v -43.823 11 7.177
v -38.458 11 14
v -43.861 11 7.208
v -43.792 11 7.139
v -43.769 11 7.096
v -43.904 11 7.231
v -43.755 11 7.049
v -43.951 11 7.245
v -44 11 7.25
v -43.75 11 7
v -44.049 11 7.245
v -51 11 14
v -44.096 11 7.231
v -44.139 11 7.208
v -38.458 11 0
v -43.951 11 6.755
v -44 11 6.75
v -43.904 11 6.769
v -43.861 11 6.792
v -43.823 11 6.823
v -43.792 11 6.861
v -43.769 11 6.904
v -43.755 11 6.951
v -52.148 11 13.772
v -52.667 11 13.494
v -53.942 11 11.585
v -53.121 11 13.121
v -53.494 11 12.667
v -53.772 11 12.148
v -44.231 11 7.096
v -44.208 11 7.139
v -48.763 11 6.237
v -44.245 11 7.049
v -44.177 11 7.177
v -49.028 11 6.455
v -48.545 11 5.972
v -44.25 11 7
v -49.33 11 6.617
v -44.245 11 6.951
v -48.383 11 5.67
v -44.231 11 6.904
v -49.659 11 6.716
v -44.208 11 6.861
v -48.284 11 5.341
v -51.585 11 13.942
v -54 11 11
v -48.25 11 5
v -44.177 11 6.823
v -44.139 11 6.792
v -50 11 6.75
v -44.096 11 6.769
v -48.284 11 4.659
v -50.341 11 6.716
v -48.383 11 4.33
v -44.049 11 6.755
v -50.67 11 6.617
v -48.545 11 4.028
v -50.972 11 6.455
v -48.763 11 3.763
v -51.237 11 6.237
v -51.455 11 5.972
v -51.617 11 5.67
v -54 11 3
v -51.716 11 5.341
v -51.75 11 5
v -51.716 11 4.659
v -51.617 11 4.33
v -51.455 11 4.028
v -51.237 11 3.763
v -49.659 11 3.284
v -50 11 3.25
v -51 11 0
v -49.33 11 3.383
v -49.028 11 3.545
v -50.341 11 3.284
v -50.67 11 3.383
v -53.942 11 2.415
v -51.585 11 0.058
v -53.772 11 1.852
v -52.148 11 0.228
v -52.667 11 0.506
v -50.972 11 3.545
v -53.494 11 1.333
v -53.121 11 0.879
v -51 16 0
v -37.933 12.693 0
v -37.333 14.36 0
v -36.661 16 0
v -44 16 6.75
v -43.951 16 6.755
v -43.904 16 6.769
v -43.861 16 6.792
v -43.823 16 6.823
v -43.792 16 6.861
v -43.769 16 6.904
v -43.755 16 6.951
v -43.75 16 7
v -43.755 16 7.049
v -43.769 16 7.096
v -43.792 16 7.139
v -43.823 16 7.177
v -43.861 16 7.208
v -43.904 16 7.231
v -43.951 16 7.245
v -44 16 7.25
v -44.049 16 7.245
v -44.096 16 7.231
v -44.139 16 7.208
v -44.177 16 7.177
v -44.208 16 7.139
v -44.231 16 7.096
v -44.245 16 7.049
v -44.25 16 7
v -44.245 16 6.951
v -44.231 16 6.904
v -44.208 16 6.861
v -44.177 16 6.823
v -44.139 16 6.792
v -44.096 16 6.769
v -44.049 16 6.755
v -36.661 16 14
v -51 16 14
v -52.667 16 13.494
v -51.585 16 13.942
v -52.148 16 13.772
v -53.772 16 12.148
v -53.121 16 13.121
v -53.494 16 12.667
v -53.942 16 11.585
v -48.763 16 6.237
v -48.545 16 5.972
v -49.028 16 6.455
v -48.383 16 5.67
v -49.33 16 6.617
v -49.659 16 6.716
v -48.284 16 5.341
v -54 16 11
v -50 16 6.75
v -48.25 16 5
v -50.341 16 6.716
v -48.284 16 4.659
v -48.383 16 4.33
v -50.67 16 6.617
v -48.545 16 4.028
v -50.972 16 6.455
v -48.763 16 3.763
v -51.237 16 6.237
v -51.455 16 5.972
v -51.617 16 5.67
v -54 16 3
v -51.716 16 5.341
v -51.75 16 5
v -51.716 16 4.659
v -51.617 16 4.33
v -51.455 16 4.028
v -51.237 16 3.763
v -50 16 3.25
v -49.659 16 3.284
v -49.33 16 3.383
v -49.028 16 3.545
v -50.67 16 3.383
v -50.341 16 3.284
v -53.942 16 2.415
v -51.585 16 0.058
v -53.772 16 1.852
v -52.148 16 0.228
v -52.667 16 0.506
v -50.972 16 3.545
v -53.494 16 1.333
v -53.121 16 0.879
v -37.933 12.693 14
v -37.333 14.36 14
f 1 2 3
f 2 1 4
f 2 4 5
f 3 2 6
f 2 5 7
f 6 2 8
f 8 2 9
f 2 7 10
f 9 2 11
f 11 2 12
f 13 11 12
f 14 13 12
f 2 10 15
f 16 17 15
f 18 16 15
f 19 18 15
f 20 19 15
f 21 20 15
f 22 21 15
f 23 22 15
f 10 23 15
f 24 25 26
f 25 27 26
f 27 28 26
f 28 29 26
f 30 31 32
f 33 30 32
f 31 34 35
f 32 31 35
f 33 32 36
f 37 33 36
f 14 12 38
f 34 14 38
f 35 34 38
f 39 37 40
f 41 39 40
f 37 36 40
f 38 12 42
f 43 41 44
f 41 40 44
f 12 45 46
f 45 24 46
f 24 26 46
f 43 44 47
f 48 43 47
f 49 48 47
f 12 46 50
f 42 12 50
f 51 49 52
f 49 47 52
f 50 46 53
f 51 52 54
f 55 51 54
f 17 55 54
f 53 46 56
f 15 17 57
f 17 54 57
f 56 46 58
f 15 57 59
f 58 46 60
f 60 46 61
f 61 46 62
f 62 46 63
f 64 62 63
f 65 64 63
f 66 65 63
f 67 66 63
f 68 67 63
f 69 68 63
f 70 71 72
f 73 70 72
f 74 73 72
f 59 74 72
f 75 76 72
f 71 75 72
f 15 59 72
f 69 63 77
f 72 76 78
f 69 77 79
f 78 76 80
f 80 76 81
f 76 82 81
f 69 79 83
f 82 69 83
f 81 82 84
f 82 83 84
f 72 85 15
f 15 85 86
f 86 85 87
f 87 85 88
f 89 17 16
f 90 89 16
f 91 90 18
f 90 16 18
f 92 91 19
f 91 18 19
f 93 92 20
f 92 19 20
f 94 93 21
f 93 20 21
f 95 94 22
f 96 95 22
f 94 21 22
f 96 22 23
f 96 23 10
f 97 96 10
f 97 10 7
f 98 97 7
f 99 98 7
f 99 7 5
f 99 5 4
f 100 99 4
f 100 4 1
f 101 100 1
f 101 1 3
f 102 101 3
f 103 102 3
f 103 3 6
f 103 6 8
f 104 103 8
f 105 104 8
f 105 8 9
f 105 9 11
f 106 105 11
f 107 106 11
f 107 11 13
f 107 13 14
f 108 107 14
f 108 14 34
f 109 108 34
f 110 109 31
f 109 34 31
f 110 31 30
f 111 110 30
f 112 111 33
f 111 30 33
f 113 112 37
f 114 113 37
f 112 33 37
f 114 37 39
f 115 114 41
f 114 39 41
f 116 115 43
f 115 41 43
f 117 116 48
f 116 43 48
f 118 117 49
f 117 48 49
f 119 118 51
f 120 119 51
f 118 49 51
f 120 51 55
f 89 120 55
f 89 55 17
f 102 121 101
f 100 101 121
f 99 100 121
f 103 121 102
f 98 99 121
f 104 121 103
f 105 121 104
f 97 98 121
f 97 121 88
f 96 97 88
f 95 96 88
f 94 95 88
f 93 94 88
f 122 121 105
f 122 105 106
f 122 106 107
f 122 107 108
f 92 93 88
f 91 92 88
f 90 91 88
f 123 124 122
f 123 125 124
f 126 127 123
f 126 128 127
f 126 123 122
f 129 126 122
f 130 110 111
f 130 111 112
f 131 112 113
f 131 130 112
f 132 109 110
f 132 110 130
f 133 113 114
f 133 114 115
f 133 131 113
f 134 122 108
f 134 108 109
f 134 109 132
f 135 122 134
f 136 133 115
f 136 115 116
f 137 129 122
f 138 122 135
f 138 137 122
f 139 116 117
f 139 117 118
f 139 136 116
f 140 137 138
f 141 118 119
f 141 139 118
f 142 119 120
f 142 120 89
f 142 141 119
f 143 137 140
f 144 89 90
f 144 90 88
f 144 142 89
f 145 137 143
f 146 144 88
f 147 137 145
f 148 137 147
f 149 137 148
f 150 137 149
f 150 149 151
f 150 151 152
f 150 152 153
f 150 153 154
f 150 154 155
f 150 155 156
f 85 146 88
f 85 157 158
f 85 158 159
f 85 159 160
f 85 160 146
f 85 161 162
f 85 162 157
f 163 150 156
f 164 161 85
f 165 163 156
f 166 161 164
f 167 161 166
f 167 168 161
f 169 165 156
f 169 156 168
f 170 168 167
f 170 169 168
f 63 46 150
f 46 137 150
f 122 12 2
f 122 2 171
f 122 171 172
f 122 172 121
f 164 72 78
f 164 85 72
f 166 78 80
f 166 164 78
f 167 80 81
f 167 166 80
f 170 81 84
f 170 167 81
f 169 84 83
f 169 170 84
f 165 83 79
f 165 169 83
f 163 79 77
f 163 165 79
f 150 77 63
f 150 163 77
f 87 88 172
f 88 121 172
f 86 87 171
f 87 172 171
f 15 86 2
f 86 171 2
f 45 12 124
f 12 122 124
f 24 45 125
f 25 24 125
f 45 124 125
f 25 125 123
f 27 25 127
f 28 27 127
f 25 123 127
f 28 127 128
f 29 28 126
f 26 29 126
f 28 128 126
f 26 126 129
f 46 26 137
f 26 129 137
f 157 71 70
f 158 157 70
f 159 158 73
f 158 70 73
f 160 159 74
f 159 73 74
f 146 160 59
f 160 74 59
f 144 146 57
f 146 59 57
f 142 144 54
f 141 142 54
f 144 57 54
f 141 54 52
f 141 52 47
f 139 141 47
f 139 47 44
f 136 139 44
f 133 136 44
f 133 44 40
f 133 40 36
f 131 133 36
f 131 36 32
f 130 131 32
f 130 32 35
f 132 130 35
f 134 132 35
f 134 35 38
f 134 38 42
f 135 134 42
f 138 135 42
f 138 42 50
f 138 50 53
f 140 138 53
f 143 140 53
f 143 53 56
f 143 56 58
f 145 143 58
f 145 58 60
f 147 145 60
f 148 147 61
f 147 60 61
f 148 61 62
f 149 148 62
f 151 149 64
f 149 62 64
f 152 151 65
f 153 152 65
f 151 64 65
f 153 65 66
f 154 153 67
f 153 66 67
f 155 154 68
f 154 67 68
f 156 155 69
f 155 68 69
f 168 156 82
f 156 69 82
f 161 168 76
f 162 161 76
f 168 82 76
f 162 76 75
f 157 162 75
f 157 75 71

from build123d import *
from build123d.topology import SkipClean

# Parameters (mm, degrees)
SKETCH1_R                      = 40
SKETCH1_R_2                    = 38
BOSS_EXTRUDE1_DEPTH            = 200
SKETCH2_R                      = 40
BOSS_EXTRUDE2_DEPTH            = 2
BOSS_EXTRUDE3_DEPTH            = 107
BOSS_EXTRUDE4_DEPTH            = 2
SKETCH5_R                      = 1.75
CUT_EXTRUDE1_DEPTH             = 225.428162226
CUT_EXTRUDE2_REACH             = 218.296
SKETCH6_R                      = 4
CUT_EXTRUDE2_DIRECTION_2_REACH = 218.296
CIRPATTERN1_COUNT              = 2
CIRPATTERN1_ANGLE              = 90
BOSS_EXTRUDE5_REACH            = 241.742
BOSS_EXTRUDE5_END_RADIUS       = 40
SKETCH7_W                      = 14
SKETCH7_H                      = 5
CUT_EXTRUDE3_REACH             = 221.818
SKETCH8_R                      = 1.75
FILLET1_R                      = 3
CUT_EXTRUDE4_REACH             = 220.598
SKETCH9_R                      = 0.25
BOSS_EXTRUDE6_START            = 2
BOSS_EXTRUDE6_DEPTH            = 2
CUT_EXTRUDE5_REACH             = 220.147


with BuildPart() as part:
    # Sketch1 → Boss-Extrude1 (new body)
    with BuildSketch(Plane.XY):
        Circle(SKETCH1_R)
        Circle(SKETCH1_R_2, mode=Mode.SUBTRACT)
    extrude(amount=BOSS_EXTRUDE1_DEPTH)

    # Sketch2 → Boss-Extrude2 (add)
    with BuildSketch(Plane.XY.offset(180)):
        Circle(SKETCH2_R)
    extrude(amount=BOSS_EXTRUDE2_DEPTH)

    # Sketch3 → Boss-Extrude3 (add)
    with BuildSketch(Plane(origin=(0, 0, 0), x_dir=(-1, 0, 0), z_dir=(0, 0, -1))):
        with BuildLine():
            Line((-24, -32), (-72, -32))
            Line((-72, -32), (-72, -30))
            Line((-72, -30), (-26.457513111, -30))
            ThreePointArc((-26.457513111, -30), (-25.248567431, -31.024342744), (-24, -32))
        make_face()
        with BuildLine():
            Line((-24, 32), (-72, 32))
            Line((-72, 32), (-72, 30))
            Line((-72, 30), (-26.457513111, 30))
            ThreePointArc((-26.457513111, 30), (-25.248567431, 31.024342744), (-24, 32))
        make_face()
    extrude(amount=-BOSS_EXTRUDE3_DEPTH)

    # Sketch4 → Boss-Extrude4 (add)
    with BuildSketch(Plane.XY.offset(107)):
        with BuildLine():
            Line((72, -32), (24, -32))
            ThreePointArc((24, -32), (40, 0), (24, 32))
            Line((24, 32), (72, 32))
            Line((72, 32), (72, -32))
        make_face()
    extrude(amount=BOSS_EXTRUDE4_DEPTH)

    # Sketch5 → Cut-Extrude1 (cut, through all)
    with BuildSketch(Plane(origin=(0, 32, 0), x_dir=(1, 0, 0), z_dir=(0, 1, 0))):
        with Locations(Location((43.5, -102.5, 0), (0, 0, 270))):
            Circle(SKETCH5_R)
        with Locations(Location((43.5, -3.5, 0), (0, 0, 270))):
            Circle(SKETCH5_R)
        with Locations(Location((68.5, -78, 0), (0, 0, 270))):
            Circle(SKETCH5_R)
    extrude(amount=-CUT_EXTRUDE1_DEPTH, mode=Mode.SUBTRACT)

    # Sketch6 → Cut-Extrude2 (cut, up to next)
    with BuildSketch(Plane(origin=(0, 0, 0), x_dir=(0, 0, 1), z_dir=(-0.7071067811865488, 0.7071067811865464, 0)), mode=Mode.PRIVATE) as cut_extrude2_sk1:
        with Locations(Location((187, 0, 0), (0, 0, 90))):
            Circle(SKETCH6_R)
    cut_extrude2_tool1 = extrude(cut_extrude2_sk1.sketch, amount=-CUT_EXTRUDE2_REACH, mode=Mode.PRIVATE) & part.part
    cut_extrude2 = cut_extrude2_tool1.solids().sort_by_distance((0, 0, 187))[0]
    add(cut_extrude2, mode=Mode.SUBTRACT)

    # Sketch6 → Cut-Extrude2 direction 2 (cut, up to next)
    with BuildSketch(Plane(origin=(0, 0, 0), x_dir=(0, 0, 1), z_dir=(-0.7071067811865488, 0.7071067811865464, 0)), mode=Mode.PRIVATE) as cut_extrude2_direction_2_sk1:
        with Locations(Location((187, 0, 0), (0, 0, 90))):
            Circle(SKETCH6_R)
    cut_extrude2_direction_2_tool1 = extrude(cut_extrude2_direction_2_sk1.sketch, amount=CUT_EXTRUDE2_DIRECTION_2_REACH, mode=Mode.PRIVATE) & part.part
    cut_extrude2_direction_2 = cut_extrude2_direction_2_tool1.solids().sort_by_distance((0, 0, 187))[0]
    add(cut_extrude2_direction_2, mode=Mode.SUBTRACT)

    # CirPattern1: Cut-Extrude2, Cut-Extrude2 direction 2 ×2 about axis
    cirpattern1_axis = Axis((0, 0, -12.1), (0, 0, 1))
    add([cut_extrude2.rotate(cirpattern1_axis, i * CIRPATTERN1_ANGLE / (CIRPATTERN1_COUNT - 1)) for i in range(1, CIRPATTERN1_COUNT)], mode=Mode.SUBTRACT)
    add([cut_extrude2_direction_2.rotate(cirpattern1_axis, i * CIRPATTERN1_ANGLE / (CIRPATTERN1_COUNT - 1)) for i in range(1, CIRPATTERN1_COUNT)], mode=Mode.SUBTRACT)

    # Boss-Extrude5: up to this cylinder (the profile starts outside it)
    boss_extrude5_end = Plane(origin=(0, 0, 7), z_dir=(0, 0, -1)) * Cylinder(BOSS_EXTRUDE5_END_RADIUS, 564.484, mode=Mode.PRIVATE)
    # Sketch7 → Boss-Extrude5 (add, up to the surface)
    with BuildSketch(Plane(origin=(-54, 0, 0), x_dir=(0, 0, -1), z_dir=(1, 0, 0)), mode=Mode.PRIVATE) as boss_extrude5_sk1:
        with Locations((-7, -13.5)):
            Rectangle(SKETCH7_W, SKETCH7_H)
    boss_extrude5_tool1 = extrude(boss_extrude5_sk1.sketch, amount=BOSS_EXTRUDE5_REACH, mode=Mode.PRIVATE) - boss_extrude5_end
    add(boss_extrude5_tool1.solids().sort_by_distance((-54, -13.5, 7))[0])
    # Sketch7 → Boss-Extrude5 (add, up to the surface)
    with BuildSketch(Plane(origin=(-54, 0, 0), x_dir=(0, 0, -1), z_dir=(1, 0, 0)), mode=Mode.PRIVATE) as boss_extrude5_sk2:
        with Locations((-7, 13.5)):
            Rectangle(SKETCH7_W, SKETCH7_H)
    boss_extrude5_tool2 = extrude(boss_extrude5_sk2.sketch, amount=BOSS_EXTRUDE5_REACH, mode=Mode.PRIVATE) - boss_extrude5_end
    add(boss_extrude5_tool2.solids().sort_by_distance((-54, 13.5, 7))[0])

    # Cut-Extrude3: up to this face of the body (flat: up to its plane)
    cut_extrude3_end = Plane(part.part.faces().sort_by_distance((-45.33030278, 16, 7))[0])
    # Sketch8 → Cut-Extrude3 (cut, up to the picked face)
    with BuildSketch(Plane.XZ.offset(16), mode=Mode.PRIVATE) as cut_extrude3_sk1:
        with Locations(Location((-50, 5, 0), (0, 0, 270))):
            Circle(SKETCH8_R)
    cut_extrude3_tool1 = split(extrude(cut_extrude3_sk1.sketch, amount=-CUT_EXTRUDE3_REACH, mode=Mode.PRIVATE), bisect_by=cut_extrude3_end, keep=Keep.BOTH, mode=Mode.PRIVATE)
    add(cut_extrude3_tool1.solids().sort_by(Axis((-50, -16, 5), (0, 1, 0)))[0], mode=Mode.SUBTRACT)

    # Fillet1
    fillet1_edges = [part.edges().sort_by_distance(p)[0] for p in [
        (-54, -13.5, 14),
        (-54, -13.5, 0),
        (-54, 13.5, 0),
        (-54, 13.5, 14),
    ]]
    fillet(fillet1_edges, radius=FILLET1_R)

    # Sketch9 → Cut-Extrude4 (cut, up to next)
    with BuildSketch(Plane.XZ.offset(-11), mode=Mode.PRIVATE) as cut_extrude4_sk1:
        with Locations(Location((-44, 7, 0), (0, 0, 270))):
            Circle(SKETCH9_R)
    cut_extrude4_tool1 = extrude(cut_extrude4_sk1.sketch, amount=-CUT_EXTRUDE4_REACH, mode=Mode.PRIVATE) & part.part
    add(cut_extrude4_tool1.solids().sort_by_distance((-44, 11, 7))[0], mode=Mode.SUBTRACT)

    # Sketch10 → Boss-Extrude6 (add)
    with SkipClean():  # the faces are left unmerged after this step: merging them gives an invalid solid
        with BuildSketch(Plane(origin=(0, 0, 0), x_dir=(-1, 0, 0), z_dir=(0, 0, -1)).offset(BOSS_EXTRUDE6_START)):
            with BuildLine():
                ThreePointArc((10, -36.66060556), (0, -38), (-10, -36.66060556))
                Line((-10, -36.66060556), (-10, -38.729833462))
                ThreePointArc((-10, -38.729833462), (0, -40), (10, -38.729833462))
                Line((10, -38.729833462), (10, -36.66060556))
            make_face()
            with BuildLine():
                ThreePointArc((10, 38.729833462), (0, 40), (-10, 38.729833462))
                Line((-10, 38.729833462), (-10, 36.66060556))
                ThreePointArc((-10, 36.66060556), (0, 38), (10, 36.66060556))
                Line((10, 36.66060556), (10, 38.729833462))
            make_face()
        extrude(amount=-BOSS_EXTRUDE6_DEPTH)

    # Sketch11 → Cut-Extrude5 (cut, up to next)
    with BuildSketch(Plane.XY.offset(200), mode=Mode.PRIVATE) as cut_extrude5_sk1:
        with BuildLine():
            ThreePointArc((14.062684519, 37.446507235), (-20.975291487, 34.059318065), (-39.768785027, 4.294617267))
            ThreePointArc((-39.768785027, 4.294617267), (-57.533773757, -120.199175418), (66.76517374, -101.118533584))
            ThreePointArc((66.76517374, -101.118533584), (210.736936915, 32.945452835), (14.062684519, 37.446507235))
        make_face()
    cut_extrude5_tool1 = extrude(cut_extrude5_sk1.sketch, amount=-CUT_EXTRUDE5_REACH, mode=Mode.PRIVATE) & part.part
    add(cut_extrude5_tool1.solids().sort_by_distance((72.535197, -23.225739, 200))[0], mode=Mode.SUBTRACT)


solid = part.part
